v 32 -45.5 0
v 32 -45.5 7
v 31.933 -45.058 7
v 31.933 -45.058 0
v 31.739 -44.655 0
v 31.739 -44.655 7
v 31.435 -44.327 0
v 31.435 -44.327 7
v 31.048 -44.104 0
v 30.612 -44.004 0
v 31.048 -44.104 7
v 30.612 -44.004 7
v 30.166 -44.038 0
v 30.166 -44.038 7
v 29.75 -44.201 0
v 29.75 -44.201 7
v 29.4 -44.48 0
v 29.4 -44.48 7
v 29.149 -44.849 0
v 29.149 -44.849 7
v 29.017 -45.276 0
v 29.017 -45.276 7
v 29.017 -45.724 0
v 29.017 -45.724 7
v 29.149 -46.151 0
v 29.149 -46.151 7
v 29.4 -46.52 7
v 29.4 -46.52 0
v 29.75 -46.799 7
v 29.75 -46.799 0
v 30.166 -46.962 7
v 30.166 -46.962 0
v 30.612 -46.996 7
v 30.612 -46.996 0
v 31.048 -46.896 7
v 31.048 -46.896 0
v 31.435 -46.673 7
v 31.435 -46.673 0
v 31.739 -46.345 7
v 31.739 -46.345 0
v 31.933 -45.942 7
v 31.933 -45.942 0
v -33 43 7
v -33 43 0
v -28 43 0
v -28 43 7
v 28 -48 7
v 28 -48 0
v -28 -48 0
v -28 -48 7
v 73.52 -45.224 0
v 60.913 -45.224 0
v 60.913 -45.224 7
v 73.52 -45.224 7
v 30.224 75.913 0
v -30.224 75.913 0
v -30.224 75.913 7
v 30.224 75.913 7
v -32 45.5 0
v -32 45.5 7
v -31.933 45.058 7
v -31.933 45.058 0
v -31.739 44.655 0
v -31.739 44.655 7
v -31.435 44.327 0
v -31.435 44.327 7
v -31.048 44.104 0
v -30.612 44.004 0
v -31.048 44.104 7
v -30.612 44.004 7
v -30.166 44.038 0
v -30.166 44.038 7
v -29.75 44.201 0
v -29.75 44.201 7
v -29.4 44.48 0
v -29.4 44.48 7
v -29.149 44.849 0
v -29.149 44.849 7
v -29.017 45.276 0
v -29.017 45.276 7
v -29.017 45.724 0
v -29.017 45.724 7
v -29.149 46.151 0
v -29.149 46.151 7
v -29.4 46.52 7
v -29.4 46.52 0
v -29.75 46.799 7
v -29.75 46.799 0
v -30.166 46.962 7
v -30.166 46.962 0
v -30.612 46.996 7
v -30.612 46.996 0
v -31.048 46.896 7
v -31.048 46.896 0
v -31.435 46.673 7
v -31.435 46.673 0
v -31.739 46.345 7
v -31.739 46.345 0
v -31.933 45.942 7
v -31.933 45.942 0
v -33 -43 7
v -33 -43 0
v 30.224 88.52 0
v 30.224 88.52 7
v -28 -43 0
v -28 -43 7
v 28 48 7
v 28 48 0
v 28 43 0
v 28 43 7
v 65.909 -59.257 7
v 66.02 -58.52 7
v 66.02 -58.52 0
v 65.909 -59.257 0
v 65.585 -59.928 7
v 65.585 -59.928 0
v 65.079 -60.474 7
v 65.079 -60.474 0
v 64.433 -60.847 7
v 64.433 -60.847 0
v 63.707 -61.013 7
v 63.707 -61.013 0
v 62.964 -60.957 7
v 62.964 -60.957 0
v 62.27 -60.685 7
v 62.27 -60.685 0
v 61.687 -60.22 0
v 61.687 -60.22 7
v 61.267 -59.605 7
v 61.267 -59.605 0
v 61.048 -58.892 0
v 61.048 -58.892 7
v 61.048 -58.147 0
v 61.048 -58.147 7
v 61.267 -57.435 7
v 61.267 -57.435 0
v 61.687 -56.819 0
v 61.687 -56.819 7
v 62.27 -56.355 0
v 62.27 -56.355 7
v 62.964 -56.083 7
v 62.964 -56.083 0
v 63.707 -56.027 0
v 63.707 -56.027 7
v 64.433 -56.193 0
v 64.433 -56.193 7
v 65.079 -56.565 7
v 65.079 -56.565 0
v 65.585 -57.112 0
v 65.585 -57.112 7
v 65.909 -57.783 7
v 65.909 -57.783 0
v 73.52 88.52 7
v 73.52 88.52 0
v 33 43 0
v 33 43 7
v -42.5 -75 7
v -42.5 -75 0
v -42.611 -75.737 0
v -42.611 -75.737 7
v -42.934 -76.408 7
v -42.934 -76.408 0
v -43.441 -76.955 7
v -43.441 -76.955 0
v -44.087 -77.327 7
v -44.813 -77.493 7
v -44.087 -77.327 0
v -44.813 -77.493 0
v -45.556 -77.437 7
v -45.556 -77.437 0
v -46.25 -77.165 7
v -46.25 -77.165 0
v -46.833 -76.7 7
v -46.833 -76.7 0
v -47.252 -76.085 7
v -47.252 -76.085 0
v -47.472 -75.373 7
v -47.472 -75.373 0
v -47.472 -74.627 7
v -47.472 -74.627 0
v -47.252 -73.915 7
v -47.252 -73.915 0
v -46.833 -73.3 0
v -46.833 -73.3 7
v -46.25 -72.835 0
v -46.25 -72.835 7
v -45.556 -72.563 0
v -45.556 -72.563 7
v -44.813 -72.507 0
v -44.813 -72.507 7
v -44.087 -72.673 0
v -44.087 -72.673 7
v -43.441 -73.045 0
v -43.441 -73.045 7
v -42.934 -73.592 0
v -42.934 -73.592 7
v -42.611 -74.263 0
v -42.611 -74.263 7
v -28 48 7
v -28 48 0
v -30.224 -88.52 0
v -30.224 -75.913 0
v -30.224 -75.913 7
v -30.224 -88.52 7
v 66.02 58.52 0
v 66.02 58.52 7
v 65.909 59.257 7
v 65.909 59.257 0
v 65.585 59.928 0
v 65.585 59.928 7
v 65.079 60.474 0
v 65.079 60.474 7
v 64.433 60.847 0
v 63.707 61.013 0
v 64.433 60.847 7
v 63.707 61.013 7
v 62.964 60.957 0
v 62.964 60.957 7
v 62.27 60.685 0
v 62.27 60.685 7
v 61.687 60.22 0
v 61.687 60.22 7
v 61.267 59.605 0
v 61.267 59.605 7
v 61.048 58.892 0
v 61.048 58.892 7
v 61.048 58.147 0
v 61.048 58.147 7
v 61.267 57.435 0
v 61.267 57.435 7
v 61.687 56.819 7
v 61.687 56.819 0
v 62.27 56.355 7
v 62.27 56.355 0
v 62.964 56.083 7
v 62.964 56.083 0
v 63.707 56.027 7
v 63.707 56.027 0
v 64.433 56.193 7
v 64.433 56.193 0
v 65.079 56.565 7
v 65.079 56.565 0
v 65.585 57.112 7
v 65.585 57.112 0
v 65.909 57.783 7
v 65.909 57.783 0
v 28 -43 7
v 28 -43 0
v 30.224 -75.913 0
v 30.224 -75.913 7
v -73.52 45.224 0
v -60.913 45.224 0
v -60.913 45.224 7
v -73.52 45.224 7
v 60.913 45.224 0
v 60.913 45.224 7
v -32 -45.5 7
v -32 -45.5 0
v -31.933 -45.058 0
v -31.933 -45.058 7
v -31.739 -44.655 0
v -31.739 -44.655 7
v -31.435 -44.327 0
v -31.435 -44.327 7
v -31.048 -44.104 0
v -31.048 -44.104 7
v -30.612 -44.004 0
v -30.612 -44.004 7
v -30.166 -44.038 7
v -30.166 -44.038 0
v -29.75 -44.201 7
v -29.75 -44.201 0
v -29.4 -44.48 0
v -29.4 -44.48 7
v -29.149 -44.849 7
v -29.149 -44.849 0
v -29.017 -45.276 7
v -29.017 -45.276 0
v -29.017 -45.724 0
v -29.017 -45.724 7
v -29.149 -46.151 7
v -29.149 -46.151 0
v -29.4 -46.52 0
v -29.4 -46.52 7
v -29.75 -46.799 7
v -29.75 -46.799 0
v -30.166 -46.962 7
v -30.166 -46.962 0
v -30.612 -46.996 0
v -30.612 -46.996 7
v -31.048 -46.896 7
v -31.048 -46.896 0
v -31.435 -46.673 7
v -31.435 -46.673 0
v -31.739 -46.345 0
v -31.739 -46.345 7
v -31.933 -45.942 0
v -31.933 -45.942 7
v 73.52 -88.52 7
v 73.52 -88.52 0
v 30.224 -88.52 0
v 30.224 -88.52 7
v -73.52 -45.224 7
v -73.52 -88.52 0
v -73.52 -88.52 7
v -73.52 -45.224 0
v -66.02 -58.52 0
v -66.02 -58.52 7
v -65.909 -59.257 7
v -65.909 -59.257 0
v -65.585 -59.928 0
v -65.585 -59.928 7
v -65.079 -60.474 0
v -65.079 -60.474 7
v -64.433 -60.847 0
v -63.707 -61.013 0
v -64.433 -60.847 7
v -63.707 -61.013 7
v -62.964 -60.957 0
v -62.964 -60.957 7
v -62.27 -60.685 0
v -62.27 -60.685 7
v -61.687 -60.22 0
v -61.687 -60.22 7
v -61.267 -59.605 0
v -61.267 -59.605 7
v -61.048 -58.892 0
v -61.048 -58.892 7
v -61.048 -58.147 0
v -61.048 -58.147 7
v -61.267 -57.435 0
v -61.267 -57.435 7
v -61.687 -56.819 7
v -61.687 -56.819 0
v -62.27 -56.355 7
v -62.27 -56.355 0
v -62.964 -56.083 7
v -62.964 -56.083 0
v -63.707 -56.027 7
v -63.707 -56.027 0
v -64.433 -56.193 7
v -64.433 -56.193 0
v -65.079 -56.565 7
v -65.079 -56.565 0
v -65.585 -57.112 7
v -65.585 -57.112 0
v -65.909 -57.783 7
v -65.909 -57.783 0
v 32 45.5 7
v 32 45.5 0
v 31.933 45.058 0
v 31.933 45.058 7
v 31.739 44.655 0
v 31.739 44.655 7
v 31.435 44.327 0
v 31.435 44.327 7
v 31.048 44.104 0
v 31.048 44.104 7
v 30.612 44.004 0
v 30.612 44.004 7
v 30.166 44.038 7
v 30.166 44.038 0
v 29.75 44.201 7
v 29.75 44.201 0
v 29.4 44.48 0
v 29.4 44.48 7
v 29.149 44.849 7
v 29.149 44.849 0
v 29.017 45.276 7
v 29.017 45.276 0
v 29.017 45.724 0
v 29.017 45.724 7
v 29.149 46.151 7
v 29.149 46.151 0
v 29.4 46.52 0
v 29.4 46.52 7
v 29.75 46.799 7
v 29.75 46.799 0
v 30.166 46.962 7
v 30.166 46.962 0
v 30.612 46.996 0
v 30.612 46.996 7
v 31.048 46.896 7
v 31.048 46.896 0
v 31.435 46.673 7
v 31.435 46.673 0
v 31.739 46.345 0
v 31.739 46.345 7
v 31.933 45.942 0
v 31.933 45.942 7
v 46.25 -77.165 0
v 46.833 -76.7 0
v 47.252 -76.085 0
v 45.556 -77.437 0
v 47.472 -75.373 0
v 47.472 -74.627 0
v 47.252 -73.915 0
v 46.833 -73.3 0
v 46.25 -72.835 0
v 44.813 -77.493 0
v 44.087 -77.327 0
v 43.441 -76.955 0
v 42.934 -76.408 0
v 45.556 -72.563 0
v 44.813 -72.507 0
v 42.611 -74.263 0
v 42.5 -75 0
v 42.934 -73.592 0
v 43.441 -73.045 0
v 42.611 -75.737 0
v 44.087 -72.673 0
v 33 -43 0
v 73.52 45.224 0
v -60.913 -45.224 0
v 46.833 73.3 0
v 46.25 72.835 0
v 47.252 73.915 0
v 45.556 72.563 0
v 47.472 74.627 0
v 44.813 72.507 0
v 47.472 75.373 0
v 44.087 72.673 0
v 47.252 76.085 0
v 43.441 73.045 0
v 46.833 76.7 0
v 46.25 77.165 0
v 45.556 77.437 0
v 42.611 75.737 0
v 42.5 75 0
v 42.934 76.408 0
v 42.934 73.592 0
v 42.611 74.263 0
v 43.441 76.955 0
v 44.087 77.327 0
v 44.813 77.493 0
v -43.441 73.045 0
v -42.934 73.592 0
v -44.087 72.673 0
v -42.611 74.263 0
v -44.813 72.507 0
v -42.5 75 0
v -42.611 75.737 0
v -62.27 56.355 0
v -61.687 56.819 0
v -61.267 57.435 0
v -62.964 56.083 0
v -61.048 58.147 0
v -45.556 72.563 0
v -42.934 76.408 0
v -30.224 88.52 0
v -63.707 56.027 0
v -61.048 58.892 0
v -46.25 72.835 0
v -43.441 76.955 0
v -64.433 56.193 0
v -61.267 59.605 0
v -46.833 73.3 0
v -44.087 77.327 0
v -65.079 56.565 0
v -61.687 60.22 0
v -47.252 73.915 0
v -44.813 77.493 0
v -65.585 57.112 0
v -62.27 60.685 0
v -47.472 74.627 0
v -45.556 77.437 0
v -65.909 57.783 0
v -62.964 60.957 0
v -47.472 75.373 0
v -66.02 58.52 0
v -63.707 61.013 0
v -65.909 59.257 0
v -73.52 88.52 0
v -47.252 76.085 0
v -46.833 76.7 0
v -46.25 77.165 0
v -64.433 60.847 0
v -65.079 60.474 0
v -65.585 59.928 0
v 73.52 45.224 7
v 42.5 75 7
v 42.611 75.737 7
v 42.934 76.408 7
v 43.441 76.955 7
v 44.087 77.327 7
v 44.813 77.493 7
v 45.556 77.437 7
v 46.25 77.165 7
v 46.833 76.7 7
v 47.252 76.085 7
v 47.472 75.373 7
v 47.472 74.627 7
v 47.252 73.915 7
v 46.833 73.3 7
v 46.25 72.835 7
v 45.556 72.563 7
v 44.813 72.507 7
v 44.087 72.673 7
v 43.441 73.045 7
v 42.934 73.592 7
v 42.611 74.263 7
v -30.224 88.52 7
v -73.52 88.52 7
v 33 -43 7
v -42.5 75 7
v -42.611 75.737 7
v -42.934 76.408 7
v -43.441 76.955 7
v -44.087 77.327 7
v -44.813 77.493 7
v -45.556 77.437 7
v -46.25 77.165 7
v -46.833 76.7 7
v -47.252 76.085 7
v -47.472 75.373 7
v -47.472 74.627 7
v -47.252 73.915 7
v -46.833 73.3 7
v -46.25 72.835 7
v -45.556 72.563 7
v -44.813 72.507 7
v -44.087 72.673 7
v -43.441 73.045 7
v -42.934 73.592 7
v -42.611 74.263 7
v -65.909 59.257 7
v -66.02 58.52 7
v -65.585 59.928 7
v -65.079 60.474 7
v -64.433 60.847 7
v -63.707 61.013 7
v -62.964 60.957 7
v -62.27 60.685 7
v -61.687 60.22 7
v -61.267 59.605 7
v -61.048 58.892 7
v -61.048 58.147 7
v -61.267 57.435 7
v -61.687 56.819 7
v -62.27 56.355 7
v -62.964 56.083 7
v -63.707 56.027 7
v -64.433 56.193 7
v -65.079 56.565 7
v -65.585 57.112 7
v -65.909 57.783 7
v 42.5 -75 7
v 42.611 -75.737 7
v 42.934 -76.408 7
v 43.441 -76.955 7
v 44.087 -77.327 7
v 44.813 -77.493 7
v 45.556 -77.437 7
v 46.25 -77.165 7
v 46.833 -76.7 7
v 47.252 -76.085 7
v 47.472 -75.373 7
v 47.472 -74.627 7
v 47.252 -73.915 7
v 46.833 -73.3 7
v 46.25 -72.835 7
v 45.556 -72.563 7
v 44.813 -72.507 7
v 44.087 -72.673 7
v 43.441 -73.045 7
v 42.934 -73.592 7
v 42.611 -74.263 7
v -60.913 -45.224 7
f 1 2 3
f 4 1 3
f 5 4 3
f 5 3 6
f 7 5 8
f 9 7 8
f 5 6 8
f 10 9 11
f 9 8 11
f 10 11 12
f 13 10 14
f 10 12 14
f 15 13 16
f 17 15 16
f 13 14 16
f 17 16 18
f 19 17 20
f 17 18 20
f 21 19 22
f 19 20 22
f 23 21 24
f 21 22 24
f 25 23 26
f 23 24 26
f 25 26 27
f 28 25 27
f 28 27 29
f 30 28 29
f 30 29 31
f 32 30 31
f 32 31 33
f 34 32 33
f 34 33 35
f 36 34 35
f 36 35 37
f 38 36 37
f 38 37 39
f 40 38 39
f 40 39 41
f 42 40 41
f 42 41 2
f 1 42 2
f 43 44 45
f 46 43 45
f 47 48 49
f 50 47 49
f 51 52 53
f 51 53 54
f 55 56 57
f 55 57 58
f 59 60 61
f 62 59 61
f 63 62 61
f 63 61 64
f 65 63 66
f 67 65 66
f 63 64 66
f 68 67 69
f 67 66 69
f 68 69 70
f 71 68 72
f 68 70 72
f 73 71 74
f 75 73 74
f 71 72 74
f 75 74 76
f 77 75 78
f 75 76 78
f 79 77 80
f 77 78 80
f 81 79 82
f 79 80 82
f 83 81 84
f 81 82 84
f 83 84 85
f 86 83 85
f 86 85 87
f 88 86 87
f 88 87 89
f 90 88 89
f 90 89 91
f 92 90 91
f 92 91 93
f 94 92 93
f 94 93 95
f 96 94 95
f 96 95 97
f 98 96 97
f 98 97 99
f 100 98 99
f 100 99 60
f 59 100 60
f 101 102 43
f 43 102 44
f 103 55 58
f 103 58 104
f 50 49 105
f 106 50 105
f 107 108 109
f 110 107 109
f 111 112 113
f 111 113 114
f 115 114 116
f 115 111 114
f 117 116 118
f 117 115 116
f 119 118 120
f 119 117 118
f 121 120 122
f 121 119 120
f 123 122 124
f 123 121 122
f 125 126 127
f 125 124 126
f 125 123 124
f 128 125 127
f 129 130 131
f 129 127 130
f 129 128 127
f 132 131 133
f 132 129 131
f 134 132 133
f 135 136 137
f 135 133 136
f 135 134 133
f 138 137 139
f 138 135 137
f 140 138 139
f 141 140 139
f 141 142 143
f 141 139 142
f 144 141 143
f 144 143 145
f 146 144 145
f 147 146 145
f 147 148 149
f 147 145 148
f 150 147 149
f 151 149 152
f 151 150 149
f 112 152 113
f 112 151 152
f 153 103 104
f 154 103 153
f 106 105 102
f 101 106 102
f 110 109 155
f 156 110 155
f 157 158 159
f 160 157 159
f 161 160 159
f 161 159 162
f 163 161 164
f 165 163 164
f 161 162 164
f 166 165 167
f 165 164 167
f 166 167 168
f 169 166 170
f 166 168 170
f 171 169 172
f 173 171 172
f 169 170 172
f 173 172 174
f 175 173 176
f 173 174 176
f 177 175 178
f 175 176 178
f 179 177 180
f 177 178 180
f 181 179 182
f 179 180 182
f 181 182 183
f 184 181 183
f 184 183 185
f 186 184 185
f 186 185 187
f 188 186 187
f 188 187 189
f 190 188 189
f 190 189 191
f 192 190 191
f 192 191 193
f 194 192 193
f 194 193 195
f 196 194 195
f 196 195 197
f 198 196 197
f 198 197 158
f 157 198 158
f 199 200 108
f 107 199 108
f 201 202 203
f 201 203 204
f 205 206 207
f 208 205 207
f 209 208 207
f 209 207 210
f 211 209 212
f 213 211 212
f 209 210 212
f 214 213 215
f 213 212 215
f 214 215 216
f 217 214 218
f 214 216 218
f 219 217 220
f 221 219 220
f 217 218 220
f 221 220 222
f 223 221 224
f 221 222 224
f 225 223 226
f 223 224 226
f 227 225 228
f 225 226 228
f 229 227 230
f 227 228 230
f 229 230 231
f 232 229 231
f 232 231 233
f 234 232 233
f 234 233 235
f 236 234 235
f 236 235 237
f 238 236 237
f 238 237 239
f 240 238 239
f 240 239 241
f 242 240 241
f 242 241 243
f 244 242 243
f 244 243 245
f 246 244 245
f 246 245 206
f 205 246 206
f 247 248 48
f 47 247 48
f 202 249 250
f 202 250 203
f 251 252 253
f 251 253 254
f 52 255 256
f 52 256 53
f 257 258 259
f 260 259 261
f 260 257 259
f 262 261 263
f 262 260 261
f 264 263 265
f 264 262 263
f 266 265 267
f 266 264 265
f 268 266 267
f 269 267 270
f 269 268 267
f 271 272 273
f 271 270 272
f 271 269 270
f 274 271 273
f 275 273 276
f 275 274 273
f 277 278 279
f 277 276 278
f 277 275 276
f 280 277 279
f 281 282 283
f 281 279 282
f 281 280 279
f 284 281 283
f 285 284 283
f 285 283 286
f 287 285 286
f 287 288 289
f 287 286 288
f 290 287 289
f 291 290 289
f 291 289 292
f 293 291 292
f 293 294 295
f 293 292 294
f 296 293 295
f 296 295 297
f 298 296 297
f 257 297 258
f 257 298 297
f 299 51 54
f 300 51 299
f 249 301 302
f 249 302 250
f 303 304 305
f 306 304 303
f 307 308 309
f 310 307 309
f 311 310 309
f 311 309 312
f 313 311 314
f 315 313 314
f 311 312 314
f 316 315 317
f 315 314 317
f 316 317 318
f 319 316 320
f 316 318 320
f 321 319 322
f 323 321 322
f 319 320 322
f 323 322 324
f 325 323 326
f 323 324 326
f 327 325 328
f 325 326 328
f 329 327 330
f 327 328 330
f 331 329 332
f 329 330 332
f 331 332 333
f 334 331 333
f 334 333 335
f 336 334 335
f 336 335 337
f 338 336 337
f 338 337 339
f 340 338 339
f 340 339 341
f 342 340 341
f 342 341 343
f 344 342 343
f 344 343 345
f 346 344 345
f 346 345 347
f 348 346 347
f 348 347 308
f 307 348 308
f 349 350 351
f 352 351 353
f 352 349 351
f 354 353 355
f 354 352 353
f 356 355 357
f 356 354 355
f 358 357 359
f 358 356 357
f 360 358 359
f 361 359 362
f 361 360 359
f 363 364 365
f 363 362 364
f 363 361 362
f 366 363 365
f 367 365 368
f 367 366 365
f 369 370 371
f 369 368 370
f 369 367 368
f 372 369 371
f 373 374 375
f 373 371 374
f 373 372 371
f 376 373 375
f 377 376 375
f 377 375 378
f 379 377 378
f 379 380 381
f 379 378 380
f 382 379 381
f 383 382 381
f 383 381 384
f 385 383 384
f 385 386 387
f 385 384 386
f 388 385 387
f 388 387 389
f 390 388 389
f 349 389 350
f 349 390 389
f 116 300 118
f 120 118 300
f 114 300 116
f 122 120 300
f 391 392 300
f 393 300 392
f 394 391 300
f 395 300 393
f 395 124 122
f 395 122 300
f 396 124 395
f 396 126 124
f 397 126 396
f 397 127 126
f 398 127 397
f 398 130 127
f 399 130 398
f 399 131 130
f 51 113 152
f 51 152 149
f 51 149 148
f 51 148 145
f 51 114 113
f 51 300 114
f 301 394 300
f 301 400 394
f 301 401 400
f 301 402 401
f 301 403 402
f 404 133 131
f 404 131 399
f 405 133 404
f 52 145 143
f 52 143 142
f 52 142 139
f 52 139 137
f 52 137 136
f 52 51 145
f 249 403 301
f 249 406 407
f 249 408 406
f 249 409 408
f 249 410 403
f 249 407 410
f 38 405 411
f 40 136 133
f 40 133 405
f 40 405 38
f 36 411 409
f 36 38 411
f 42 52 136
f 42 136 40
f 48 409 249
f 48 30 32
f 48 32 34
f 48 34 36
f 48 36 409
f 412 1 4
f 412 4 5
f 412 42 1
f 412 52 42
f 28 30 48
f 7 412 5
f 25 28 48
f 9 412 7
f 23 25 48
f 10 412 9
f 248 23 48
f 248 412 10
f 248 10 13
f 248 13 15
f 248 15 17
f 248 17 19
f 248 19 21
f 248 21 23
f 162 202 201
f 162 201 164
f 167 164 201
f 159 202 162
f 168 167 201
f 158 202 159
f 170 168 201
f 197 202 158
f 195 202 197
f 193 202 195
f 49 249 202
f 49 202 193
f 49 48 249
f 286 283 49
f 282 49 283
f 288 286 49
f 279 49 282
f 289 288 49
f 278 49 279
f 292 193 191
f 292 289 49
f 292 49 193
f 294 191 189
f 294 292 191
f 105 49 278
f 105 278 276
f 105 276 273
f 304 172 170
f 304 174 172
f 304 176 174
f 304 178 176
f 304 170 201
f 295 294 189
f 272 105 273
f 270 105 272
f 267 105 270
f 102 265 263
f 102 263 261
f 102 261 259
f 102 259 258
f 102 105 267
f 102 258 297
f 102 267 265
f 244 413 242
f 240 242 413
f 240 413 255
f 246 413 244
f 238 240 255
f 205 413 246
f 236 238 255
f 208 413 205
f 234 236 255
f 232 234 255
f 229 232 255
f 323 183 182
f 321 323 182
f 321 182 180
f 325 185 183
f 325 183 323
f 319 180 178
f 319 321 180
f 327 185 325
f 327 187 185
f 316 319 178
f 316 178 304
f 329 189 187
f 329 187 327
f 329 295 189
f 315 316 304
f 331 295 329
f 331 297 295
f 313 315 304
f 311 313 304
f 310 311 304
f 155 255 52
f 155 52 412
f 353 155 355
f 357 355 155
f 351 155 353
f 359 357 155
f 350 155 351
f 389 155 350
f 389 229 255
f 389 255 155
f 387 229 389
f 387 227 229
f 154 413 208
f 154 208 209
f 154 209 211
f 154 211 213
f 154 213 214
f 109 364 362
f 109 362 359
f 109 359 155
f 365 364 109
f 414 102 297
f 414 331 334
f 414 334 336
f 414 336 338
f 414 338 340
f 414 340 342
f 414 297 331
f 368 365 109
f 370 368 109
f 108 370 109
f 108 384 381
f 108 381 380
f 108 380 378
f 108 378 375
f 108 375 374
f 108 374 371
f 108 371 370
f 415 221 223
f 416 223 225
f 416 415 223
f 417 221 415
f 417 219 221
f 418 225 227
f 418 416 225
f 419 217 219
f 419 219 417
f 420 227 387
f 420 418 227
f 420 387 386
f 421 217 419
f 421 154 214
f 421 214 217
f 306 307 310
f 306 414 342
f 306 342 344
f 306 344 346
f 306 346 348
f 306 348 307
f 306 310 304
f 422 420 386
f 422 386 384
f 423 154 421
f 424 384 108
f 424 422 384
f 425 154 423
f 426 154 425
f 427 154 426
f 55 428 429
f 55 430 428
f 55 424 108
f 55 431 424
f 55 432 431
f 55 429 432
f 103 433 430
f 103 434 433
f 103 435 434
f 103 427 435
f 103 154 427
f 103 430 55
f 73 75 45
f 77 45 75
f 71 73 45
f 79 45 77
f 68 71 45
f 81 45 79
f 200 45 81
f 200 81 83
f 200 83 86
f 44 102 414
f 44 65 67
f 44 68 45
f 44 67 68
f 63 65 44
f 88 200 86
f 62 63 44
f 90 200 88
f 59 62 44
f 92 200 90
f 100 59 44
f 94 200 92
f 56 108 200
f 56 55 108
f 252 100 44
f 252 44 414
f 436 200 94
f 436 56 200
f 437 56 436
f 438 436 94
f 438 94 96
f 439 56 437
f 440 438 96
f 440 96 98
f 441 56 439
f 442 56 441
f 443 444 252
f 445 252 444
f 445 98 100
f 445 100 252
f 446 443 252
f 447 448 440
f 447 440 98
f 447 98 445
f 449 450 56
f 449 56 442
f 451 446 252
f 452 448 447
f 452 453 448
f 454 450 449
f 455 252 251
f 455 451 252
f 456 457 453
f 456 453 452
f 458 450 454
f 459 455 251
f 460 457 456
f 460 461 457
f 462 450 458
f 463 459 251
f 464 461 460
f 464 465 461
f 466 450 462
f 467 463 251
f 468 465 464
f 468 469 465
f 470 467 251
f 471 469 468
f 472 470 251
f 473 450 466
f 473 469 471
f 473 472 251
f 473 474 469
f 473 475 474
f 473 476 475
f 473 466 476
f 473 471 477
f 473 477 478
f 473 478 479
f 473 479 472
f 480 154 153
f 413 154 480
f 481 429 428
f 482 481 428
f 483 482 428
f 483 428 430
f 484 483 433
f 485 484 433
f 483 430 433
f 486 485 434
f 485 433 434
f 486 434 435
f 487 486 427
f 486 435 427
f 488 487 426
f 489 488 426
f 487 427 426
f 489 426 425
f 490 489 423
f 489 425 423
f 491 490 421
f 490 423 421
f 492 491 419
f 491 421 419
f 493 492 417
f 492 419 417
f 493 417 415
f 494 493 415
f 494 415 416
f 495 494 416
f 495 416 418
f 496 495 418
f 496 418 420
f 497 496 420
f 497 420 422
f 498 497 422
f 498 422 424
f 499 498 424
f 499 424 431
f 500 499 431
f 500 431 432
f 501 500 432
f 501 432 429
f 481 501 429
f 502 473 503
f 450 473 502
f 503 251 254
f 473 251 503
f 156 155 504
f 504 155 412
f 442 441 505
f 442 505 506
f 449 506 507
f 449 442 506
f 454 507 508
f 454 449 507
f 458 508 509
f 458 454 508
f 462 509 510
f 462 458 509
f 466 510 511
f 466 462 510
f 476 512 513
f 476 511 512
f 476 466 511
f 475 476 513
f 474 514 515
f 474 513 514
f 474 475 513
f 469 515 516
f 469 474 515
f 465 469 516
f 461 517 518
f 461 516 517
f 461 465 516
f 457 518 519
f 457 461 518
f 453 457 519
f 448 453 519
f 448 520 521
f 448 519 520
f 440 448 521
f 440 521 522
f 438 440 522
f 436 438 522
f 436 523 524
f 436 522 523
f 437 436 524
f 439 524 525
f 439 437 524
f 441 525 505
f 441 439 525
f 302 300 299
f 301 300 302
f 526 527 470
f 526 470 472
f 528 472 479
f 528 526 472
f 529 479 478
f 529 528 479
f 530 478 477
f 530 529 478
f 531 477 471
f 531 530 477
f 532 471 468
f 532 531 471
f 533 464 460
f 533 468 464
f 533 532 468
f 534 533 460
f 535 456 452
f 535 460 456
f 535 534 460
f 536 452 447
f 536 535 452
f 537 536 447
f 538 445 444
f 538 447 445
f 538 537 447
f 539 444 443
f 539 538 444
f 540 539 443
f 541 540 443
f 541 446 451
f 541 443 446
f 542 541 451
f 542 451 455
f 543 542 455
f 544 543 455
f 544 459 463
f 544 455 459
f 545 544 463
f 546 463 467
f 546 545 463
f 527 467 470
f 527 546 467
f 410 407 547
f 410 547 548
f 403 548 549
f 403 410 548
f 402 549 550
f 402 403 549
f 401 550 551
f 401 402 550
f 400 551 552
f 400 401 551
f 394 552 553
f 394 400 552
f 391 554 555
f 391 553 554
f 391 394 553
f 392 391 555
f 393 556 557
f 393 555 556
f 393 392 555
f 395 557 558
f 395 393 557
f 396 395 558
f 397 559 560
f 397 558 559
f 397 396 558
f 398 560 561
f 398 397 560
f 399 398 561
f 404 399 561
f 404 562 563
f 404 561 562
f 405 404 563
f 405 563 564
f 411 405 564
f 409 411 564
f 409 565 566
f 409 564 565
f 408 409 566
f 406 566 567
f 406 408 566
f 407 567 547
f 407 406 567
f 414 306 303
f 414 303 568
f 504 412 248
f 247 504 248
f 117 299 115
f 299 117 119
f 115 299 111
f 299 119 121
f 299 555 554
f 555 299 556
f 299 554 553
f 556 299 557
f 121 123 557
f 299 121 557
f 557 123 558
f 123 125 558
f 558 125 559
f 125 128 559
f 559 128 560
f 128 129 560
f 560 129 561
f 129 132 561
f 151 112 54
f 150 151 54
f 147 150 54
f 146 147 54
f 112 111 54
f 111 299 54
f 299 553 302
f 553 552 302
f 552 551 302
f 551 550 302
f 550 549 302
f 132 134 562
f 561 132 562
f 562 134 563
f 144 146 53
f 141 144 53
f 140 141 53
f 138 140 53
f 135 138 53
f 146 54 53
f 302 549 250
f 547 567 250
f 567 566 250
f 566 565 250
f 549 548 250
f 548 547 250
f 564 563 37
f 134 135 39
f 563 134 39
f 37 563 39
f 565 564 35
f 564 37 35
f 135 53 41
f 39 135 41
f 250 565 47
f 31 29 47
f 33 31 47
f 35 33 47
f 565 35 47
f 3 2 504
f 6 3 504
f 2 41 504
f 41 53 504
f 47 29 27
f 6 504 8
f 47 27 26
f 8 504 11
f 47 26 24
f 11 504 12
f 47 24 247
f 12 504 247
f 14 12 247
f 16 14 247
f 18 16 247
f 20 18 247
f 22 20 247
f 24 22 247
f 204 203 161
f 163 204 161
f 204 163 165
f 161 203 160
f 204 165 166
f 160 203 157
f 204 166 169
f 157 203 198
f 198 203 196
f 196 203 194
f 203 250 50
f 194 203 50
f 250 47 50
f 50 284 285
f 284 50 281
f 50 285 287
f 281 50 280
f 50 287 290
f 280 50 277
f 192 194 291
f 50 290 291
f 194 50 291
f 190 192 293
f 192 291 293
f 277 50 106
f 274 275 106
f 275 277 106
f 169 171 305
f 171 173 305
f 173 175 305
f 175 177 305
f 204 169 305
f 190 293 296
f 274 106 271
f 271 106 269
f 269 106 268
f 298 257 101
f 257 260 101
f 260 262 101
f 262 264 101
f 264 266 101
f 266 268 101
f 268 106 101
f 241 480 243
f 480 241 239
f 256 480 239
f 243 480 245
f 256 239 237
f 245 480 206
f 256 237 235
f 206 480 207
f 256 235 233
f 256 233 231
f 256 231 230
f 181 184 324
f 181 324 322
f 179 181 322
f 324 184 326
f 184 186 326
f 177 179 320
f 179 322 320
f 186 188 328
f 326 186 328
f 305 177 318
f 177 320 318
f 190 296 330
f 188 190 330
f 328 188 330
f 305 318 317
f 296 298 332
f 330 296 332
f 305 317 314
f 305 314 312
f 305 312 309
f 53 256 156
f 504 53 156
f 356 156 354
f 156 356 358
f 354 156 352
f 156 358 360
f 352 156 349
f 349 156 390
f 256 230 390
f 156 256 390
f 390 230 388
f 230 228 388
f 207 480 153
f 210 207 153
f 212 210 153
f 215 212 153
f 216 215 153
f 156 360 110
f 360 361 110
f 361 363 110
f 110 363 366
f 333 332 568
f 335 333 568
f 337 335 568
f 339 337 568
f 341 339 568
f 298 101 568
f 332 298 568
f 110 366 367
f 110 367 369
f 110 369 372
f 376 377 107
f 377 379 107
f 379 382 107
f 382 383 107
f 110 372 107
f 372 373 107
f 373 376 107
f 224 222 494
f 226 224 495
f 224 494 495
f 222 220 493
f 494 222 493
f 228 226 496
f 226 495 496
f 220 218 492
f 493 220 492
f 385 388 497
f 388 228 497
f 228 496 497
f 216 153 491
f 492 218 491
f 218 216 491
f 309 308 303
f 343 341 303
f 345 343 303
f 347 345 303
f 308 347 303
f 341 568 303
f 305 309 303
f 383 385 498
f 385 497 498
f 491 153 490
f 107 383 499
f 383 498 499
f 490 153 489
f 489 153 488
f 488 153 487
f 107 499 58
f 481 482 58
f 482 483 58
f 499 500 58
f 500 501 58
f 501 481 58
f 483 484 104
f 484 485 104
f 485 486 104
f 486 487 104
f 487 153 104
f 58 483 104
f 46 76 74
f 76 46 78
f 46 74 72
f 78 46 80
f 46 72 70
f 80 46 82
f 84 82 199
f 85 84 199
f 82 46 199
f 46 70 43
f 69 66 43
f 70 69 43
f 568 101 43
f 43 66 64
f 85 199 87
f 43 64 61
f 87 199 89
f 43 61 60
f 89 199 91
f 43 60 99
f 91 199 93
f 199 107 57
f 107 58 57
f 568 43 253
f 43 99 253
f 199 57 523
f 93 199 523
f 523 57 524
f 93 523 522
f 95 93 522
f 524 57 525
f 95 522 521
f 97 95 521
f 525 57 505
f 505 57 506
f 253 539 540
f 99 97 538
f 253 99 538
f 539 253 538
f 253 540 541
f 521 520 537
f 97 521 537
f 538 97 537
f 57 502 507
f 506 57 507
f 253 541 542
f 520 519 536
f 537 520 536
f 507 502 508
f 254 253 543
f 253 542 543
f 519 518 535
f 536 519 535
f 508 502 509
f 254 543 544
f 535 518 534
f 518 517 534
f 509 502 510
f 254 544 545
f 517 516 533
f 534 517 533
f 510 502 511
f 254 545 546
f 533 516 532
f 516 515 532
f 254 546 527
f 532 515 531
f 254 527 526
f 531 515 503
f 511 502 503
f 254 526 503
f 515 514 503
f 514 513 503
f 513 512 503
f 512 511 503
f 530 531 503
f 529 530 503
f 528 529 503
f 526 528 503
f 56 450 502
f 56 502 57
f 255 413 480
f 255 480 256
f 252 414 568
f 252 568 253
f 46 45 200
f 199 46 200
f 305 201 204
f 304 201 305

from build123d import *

# Parameters (mm, degrees)
BOSS_EXTRUDE1_DEPTH     = 7
SKETCH2_R               = 1.5
CUT_EXTRUDE1_DEPTH      = 10
MIRROR2_COPY_1_SKETCH_R = 1.5
MIRROR2_COPY_1_DEPTH    = 10
CUT_EXTRUDE4_START      = -8
SKETCH5_R               = 2.5
CUT_EXTRUDE4_DEPTH      = 9
MIRROR6_START           = -8
MIRROR6_COPY_1_SKETCH_R = 2.5
MIRROR6_COPY_1_DEPTH    = 9
CUT_EXTRUDE5_START      = -8
SKETCH6_R               = 2.5
CUT_EXTRUDE5_DEPTH      = 9
MIRROR9_START           = -8
MIRROR9_COPY_1_SKETCH_R = 2.5
MIRROR9_COPY_1_DEPTH    = 9


with BuildPart() as part:
    # Sketch1 → Boss-Extrude1 (new body)
    with BuildSketch(Plane.XY):
        Polygon((-30.22420519, 75.913209403), (30.22420519, 75.913209403), (30.22420519, 88.519824063), (73.519824063, 88.519824063), (73.519824063, 45.22420519), (60.913209403, 45.22420519), (60.913209403, -45.22420519), (73.519824063, -45.22420519), (73.519824063, -88.519824063), (30.22420519, -88.519824063), (30.22420519, -75.913209403), (-30.22420519, -75.913209403), (-30.22420519, -88.519824063), (-73.519824063, -88.519824063), (-73.519824063, -45.22420519), (-60.913209403, -45.22420519), (-60.913209403, 45.22420519), (-73.519824063, 45.22420519), (-73.519824063, 88.519824063), (-30.22420519, 88.519824063), align=None)
        Polygon((-28, 48), (28, 48), (28, 43), (33, 43), (33, -43), (28, -43), (28, -48), (-28, -48), (-28, -43), (-33, -43), (-33, 43), (-28, 43), align=None, mode=Mode.SUBTRACT)
    extrude(amount=BOSS_EXTRUDE1_DEPTH)

    # Sketch2 → Cut-Extrude1 (cut)
    with BuildSketch(Plane.XY.offset(7)):
        with Locations((30.5, -45.5)):
            Circle(SKETCH2_R)
    cut_extrude1 = extrude(amount=-CUT_EXTRUDE1_DEPTH, mode=Mode.SUBTRACT)

    # Mirror1: Cut-Extrude1 across plane
    add(cut_extrude1.mirror(Plane(origin=(0, 0, 0), x_dir=(0, 0, 1), z_dir=(1, 0, 0))), mode=Mode.SUBTRACT)

    # Mirror2: Cut-Extrude1 across plane
    add(cut_extrude1.mirror(Plane.ZX), mode=Mode.SUBTRACT)

    # Mirror2 copy 1 sketch → Mirror2 copy 1 (cut)
    with BuildSketch(Plane(origin=(0, 0, 7), x_dir=(-1, 0, 0), z_dir=(0, 0, 1))):
        with Locations((30.5, -45.5)):
            Circle(MIRROR2_COPY_1_SKETCH_R)
    extrude(amount=-MIRROR2_COPY_1_DEPTH, mode=Mode.SUBTRACT)

    # Sketch5 → Cut-Extrude4 (cut)
    with BuildSketch(Plane.XY.offset(7).offset(CUT_EXTRUDE4_START)):
        with Locations((-45, 75)):
            Circle(SKETCH5_R)
    cut_extrude4 = extrude(amount=CUT_EXTRUDE4_DEPTH, mode=Mode.SUBTRACT)

    # Mirror5: Cut-Extrude4 across plane
    add(cut_extrude4.mirror(Plane.ZX), mode=Mode.SUBTRACT)

    # Mirror6: Cut-Extrude4 across plane
    add(cut_extrude4.mirror(Plane(origin=(0, 0, 0), x_dir=(0, 0, 1), z_dir=(1, 0, 0))), mode=Mode.SUBTRACT)

    # Mirror6 copy 1 sketch → Mirror6 copy 1 (cut)
    with BuildSketch(Plane(origin=(0, 0, 7), x_dir=(-1, 0, 0), z_dir=(0, 0, 1)).offset(MIRROR6_START)):
        with Locations((-45, 75)):
            Circle(MIRROR6_COPY_1_SKETCH_R)
    extrude(amount=MIRROR6_COPY_1_DEPTH, mode=Mode.SUBTRACT)

    # Sketch6 → Cut-Extrude5 (cut)
    with BuildSketch(Plane(origin=(0, 0, 0), x_dir=(-1, 0, 0), z_dir=(0, 0, -1)).offset(CUT_EXTRUDE5_START)):
        with Locations((63.519824063, 58.519824063)):
            Circle(SKETCH6_R)
    cut_extrude5 = extrude(amount=CUT_EXTRUDE5_DEPTH, mode=Mode.SUBTRACT)

    # Mirror8: Cut-Extrude5 across plane
    add(cut_extrude5.mirror(Plane(origin=(0, 0, 0), x_dir=(0, 0, 1), z_dir=(1, 0, 0))), mode=Mode.SUBTRACT)

    # Mirror9: Cut-Extrude5 across plane
    add(cut_extrude5.mirror(Plane.ZX), mode=Mode.SUBTRACT)

    # Mirror9 copy 1 sketch → Mirror9 copy 1 (cut)
    with BuildSketch(Plane(origin=(0, 0, 0), x_dir=(1, 0, 0), z_dir=(0, 0, -1)).offset(MIRROR9_START)):
        with Locations((63.519824063, 58.519824063)):
            Circle(MIRROR9_COPY_1_SKETCH_R)
    extrude(amount=MIRROR9_COPY_1_DEPTH, mode=Mode.SUBTRACT)


solid = part.part
